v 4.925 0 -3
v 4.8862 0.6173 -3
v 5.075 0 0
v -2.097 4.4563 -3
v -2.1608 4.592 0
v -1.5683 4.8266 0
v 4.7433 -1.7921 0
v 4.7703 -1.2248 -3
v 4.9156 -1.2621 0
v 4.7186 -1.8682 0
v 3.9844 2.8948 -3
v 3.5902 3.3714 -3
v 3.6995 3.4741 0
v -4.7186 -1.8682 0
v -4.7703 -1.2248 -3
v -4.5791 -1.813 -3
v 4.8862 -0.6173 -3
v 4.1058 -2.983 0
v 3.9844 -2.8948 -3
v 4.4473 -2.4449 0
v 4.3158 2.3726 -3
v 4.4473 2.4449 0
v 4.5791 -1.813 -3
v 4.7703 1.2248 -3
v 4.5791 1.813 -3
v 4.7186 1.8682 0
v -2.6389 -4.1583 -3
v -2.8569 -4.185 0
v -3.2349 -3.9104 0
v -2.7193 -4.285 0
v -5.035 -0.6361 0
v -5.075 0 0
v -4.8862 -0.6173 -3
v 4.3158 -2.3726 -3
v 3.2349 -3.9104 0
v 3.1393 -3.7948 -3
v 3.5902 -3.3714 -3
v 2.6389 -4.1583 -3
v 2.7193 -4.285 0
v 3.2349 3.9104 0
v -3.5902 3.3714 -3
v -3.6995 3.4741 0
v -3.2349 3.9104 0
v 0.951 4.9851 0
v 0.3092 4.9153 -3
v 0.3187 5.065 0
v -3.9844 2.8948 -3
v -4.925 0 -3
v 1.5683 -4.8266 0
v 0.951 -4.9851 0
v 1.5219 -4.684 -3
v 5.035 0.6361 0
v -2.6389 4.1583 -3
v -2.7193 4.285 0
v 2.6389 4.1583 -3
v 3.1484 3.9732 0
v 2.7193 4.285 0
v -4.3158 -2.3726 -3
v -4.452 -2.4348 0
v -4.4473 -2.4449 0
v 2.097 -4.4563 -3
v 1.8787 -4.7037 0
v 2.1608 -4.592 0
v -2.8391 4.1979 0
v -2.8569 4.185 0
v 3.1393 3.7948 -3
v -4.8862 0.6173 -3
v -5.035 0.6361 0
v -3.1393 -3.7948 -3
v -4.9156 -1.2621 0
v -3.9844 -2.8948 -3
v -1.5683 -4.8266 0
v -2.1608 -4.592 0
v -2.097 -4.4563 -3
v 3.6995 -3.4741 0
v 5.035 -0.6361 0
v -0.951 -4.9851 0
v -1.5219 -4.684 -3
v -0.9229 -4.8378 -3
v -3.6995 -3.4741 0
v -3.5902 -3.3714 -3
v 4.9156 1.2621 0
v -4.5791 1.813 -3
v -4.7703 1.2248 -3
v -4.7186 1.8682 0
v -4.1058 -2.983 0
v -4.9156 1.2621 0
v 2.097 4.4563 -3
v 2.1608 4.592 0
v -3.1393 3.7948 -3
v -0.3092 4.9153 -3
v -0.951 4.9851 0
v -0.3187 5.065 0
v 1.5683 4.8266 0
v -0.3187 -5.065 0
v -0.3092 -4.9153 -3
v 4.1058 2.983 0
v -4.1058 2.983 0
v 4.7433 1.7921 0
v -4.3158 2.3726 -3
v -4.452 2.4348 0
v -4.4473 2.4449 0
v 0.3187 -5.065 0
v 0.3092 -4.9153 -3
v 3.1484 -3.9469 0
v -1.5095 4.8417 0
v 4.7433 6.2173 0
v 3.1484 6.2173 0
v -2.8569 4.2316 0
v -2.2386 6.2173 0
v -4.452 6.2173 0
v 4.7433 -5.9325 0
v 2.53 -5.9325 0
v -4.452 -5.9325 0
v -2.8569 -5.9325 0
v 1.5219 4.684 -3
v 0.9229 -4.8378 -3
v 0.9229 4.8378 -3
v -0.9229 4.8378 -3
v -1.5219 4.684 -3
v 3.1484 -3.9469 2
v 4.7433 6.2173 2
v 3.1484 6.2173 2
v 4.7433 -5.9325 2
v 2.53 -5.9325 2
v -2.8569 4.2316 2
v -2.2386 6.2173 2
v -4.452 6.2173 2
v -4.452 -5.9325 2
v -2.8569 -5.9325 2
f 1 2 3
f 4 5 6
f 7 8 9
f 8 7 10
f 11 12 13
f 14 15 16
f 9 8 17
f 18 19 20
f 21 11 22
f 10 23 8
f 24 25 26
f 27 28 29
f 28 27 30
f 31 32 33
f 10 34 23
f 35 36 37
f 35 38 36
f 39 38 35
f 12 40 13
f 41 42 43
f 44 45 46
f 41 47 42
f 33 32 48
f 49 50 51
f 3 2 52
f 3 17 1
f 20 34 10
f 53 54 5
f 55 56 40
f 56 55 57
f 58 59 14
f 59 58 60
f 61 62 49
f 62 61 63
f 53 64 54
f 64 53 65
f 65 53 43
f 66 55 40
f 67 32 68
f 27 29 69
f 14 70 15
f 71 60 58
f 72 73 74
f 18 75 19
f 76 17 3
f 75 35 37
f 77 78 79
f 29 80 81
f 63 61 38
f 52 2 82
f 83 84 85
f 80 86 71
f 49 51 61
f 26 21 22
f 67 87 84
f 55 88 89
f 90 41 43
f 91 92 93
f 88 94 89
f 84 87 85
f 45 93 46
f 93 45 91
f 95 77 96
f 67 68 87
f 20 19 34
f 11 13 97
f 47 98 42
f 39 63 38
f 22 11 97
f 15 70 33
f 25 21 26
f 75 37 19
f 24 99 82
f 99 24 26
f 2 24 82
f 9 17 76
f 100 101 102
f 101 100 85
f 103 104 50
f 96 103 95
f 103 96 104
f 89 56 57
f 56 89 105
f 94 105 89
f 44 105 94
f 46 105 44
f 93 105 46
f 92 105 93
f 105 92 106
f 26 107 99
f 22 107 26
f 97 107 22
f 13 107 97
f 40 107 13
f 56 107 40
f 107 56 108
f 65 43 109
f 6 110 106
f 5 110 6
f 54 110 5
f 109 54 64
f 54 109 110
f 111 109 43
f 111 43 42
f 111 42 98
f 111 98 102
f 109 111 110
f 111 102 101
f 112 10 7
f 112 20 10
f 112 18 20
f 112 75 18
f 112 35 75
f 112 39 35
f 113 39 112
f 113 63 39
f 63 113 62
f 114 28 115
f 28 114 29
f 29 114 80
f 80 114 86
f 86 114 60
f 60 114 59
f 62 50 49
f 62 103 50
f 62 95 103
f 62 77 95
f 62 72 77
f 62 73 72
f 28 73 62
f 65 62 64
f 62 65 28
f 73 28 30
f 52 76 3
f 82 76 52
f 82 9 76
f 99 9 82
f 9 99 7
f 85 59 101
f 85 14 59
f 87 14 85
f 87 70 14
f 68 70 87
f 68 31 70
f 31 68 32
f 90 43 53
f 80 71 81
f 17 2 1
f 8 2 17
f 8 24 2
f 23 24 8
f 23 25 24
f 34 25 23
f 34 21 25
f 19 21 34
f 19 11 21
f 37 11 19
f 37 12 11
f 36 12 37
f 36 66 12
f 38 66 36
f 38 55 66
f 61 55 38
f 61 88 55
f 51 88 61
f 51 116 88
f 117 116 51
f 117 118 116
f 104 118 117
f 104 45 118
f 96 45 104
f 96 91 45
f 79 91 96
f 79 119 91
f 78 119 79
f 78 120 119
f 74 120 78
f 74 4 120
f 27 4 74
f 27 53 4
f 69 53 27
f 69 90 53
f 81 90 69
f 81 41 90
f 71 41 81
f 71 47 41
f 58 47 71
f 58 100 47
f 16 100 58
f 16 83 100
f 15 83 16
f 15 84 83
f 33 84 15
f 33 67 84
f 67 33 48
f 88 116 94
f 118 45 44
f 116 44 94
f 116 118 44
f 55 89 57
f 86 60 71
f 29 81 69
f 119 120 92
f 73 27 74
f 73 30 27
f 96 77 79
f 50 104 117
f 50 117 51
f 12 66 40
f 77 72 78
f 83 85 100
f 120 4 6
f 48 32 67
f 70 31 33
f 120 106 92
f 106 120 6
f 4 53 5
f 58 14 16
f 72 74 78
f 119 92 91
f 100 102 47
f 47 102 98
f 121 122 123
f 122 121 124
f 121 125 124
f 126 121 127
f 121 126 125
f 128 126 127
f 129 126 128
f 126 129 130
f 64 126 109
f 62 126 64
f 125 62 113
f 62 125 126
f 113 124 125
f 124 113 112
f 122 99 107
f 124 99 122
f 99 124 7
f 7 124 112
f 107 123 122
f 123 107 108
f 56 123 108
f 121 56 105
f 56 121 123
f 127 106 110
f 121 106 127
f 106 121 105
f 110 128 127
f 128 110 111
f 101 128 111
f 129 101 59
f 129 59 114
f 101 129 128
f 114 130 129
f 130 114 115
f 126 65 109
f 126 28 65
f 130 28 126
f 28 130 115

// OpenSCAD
$fn = 50;

difference() {
	union() {
		translate(v = [0, 0, -3.0]) {
			cylinder(h = 3, r1 = 4.925, r2 = 5.075);
		}
		linear_extrude(height = 2) {
			text(font = "Impact", halign = "center", size = 12, text = "N", valign = "center");
		}
	}
	union();
}
